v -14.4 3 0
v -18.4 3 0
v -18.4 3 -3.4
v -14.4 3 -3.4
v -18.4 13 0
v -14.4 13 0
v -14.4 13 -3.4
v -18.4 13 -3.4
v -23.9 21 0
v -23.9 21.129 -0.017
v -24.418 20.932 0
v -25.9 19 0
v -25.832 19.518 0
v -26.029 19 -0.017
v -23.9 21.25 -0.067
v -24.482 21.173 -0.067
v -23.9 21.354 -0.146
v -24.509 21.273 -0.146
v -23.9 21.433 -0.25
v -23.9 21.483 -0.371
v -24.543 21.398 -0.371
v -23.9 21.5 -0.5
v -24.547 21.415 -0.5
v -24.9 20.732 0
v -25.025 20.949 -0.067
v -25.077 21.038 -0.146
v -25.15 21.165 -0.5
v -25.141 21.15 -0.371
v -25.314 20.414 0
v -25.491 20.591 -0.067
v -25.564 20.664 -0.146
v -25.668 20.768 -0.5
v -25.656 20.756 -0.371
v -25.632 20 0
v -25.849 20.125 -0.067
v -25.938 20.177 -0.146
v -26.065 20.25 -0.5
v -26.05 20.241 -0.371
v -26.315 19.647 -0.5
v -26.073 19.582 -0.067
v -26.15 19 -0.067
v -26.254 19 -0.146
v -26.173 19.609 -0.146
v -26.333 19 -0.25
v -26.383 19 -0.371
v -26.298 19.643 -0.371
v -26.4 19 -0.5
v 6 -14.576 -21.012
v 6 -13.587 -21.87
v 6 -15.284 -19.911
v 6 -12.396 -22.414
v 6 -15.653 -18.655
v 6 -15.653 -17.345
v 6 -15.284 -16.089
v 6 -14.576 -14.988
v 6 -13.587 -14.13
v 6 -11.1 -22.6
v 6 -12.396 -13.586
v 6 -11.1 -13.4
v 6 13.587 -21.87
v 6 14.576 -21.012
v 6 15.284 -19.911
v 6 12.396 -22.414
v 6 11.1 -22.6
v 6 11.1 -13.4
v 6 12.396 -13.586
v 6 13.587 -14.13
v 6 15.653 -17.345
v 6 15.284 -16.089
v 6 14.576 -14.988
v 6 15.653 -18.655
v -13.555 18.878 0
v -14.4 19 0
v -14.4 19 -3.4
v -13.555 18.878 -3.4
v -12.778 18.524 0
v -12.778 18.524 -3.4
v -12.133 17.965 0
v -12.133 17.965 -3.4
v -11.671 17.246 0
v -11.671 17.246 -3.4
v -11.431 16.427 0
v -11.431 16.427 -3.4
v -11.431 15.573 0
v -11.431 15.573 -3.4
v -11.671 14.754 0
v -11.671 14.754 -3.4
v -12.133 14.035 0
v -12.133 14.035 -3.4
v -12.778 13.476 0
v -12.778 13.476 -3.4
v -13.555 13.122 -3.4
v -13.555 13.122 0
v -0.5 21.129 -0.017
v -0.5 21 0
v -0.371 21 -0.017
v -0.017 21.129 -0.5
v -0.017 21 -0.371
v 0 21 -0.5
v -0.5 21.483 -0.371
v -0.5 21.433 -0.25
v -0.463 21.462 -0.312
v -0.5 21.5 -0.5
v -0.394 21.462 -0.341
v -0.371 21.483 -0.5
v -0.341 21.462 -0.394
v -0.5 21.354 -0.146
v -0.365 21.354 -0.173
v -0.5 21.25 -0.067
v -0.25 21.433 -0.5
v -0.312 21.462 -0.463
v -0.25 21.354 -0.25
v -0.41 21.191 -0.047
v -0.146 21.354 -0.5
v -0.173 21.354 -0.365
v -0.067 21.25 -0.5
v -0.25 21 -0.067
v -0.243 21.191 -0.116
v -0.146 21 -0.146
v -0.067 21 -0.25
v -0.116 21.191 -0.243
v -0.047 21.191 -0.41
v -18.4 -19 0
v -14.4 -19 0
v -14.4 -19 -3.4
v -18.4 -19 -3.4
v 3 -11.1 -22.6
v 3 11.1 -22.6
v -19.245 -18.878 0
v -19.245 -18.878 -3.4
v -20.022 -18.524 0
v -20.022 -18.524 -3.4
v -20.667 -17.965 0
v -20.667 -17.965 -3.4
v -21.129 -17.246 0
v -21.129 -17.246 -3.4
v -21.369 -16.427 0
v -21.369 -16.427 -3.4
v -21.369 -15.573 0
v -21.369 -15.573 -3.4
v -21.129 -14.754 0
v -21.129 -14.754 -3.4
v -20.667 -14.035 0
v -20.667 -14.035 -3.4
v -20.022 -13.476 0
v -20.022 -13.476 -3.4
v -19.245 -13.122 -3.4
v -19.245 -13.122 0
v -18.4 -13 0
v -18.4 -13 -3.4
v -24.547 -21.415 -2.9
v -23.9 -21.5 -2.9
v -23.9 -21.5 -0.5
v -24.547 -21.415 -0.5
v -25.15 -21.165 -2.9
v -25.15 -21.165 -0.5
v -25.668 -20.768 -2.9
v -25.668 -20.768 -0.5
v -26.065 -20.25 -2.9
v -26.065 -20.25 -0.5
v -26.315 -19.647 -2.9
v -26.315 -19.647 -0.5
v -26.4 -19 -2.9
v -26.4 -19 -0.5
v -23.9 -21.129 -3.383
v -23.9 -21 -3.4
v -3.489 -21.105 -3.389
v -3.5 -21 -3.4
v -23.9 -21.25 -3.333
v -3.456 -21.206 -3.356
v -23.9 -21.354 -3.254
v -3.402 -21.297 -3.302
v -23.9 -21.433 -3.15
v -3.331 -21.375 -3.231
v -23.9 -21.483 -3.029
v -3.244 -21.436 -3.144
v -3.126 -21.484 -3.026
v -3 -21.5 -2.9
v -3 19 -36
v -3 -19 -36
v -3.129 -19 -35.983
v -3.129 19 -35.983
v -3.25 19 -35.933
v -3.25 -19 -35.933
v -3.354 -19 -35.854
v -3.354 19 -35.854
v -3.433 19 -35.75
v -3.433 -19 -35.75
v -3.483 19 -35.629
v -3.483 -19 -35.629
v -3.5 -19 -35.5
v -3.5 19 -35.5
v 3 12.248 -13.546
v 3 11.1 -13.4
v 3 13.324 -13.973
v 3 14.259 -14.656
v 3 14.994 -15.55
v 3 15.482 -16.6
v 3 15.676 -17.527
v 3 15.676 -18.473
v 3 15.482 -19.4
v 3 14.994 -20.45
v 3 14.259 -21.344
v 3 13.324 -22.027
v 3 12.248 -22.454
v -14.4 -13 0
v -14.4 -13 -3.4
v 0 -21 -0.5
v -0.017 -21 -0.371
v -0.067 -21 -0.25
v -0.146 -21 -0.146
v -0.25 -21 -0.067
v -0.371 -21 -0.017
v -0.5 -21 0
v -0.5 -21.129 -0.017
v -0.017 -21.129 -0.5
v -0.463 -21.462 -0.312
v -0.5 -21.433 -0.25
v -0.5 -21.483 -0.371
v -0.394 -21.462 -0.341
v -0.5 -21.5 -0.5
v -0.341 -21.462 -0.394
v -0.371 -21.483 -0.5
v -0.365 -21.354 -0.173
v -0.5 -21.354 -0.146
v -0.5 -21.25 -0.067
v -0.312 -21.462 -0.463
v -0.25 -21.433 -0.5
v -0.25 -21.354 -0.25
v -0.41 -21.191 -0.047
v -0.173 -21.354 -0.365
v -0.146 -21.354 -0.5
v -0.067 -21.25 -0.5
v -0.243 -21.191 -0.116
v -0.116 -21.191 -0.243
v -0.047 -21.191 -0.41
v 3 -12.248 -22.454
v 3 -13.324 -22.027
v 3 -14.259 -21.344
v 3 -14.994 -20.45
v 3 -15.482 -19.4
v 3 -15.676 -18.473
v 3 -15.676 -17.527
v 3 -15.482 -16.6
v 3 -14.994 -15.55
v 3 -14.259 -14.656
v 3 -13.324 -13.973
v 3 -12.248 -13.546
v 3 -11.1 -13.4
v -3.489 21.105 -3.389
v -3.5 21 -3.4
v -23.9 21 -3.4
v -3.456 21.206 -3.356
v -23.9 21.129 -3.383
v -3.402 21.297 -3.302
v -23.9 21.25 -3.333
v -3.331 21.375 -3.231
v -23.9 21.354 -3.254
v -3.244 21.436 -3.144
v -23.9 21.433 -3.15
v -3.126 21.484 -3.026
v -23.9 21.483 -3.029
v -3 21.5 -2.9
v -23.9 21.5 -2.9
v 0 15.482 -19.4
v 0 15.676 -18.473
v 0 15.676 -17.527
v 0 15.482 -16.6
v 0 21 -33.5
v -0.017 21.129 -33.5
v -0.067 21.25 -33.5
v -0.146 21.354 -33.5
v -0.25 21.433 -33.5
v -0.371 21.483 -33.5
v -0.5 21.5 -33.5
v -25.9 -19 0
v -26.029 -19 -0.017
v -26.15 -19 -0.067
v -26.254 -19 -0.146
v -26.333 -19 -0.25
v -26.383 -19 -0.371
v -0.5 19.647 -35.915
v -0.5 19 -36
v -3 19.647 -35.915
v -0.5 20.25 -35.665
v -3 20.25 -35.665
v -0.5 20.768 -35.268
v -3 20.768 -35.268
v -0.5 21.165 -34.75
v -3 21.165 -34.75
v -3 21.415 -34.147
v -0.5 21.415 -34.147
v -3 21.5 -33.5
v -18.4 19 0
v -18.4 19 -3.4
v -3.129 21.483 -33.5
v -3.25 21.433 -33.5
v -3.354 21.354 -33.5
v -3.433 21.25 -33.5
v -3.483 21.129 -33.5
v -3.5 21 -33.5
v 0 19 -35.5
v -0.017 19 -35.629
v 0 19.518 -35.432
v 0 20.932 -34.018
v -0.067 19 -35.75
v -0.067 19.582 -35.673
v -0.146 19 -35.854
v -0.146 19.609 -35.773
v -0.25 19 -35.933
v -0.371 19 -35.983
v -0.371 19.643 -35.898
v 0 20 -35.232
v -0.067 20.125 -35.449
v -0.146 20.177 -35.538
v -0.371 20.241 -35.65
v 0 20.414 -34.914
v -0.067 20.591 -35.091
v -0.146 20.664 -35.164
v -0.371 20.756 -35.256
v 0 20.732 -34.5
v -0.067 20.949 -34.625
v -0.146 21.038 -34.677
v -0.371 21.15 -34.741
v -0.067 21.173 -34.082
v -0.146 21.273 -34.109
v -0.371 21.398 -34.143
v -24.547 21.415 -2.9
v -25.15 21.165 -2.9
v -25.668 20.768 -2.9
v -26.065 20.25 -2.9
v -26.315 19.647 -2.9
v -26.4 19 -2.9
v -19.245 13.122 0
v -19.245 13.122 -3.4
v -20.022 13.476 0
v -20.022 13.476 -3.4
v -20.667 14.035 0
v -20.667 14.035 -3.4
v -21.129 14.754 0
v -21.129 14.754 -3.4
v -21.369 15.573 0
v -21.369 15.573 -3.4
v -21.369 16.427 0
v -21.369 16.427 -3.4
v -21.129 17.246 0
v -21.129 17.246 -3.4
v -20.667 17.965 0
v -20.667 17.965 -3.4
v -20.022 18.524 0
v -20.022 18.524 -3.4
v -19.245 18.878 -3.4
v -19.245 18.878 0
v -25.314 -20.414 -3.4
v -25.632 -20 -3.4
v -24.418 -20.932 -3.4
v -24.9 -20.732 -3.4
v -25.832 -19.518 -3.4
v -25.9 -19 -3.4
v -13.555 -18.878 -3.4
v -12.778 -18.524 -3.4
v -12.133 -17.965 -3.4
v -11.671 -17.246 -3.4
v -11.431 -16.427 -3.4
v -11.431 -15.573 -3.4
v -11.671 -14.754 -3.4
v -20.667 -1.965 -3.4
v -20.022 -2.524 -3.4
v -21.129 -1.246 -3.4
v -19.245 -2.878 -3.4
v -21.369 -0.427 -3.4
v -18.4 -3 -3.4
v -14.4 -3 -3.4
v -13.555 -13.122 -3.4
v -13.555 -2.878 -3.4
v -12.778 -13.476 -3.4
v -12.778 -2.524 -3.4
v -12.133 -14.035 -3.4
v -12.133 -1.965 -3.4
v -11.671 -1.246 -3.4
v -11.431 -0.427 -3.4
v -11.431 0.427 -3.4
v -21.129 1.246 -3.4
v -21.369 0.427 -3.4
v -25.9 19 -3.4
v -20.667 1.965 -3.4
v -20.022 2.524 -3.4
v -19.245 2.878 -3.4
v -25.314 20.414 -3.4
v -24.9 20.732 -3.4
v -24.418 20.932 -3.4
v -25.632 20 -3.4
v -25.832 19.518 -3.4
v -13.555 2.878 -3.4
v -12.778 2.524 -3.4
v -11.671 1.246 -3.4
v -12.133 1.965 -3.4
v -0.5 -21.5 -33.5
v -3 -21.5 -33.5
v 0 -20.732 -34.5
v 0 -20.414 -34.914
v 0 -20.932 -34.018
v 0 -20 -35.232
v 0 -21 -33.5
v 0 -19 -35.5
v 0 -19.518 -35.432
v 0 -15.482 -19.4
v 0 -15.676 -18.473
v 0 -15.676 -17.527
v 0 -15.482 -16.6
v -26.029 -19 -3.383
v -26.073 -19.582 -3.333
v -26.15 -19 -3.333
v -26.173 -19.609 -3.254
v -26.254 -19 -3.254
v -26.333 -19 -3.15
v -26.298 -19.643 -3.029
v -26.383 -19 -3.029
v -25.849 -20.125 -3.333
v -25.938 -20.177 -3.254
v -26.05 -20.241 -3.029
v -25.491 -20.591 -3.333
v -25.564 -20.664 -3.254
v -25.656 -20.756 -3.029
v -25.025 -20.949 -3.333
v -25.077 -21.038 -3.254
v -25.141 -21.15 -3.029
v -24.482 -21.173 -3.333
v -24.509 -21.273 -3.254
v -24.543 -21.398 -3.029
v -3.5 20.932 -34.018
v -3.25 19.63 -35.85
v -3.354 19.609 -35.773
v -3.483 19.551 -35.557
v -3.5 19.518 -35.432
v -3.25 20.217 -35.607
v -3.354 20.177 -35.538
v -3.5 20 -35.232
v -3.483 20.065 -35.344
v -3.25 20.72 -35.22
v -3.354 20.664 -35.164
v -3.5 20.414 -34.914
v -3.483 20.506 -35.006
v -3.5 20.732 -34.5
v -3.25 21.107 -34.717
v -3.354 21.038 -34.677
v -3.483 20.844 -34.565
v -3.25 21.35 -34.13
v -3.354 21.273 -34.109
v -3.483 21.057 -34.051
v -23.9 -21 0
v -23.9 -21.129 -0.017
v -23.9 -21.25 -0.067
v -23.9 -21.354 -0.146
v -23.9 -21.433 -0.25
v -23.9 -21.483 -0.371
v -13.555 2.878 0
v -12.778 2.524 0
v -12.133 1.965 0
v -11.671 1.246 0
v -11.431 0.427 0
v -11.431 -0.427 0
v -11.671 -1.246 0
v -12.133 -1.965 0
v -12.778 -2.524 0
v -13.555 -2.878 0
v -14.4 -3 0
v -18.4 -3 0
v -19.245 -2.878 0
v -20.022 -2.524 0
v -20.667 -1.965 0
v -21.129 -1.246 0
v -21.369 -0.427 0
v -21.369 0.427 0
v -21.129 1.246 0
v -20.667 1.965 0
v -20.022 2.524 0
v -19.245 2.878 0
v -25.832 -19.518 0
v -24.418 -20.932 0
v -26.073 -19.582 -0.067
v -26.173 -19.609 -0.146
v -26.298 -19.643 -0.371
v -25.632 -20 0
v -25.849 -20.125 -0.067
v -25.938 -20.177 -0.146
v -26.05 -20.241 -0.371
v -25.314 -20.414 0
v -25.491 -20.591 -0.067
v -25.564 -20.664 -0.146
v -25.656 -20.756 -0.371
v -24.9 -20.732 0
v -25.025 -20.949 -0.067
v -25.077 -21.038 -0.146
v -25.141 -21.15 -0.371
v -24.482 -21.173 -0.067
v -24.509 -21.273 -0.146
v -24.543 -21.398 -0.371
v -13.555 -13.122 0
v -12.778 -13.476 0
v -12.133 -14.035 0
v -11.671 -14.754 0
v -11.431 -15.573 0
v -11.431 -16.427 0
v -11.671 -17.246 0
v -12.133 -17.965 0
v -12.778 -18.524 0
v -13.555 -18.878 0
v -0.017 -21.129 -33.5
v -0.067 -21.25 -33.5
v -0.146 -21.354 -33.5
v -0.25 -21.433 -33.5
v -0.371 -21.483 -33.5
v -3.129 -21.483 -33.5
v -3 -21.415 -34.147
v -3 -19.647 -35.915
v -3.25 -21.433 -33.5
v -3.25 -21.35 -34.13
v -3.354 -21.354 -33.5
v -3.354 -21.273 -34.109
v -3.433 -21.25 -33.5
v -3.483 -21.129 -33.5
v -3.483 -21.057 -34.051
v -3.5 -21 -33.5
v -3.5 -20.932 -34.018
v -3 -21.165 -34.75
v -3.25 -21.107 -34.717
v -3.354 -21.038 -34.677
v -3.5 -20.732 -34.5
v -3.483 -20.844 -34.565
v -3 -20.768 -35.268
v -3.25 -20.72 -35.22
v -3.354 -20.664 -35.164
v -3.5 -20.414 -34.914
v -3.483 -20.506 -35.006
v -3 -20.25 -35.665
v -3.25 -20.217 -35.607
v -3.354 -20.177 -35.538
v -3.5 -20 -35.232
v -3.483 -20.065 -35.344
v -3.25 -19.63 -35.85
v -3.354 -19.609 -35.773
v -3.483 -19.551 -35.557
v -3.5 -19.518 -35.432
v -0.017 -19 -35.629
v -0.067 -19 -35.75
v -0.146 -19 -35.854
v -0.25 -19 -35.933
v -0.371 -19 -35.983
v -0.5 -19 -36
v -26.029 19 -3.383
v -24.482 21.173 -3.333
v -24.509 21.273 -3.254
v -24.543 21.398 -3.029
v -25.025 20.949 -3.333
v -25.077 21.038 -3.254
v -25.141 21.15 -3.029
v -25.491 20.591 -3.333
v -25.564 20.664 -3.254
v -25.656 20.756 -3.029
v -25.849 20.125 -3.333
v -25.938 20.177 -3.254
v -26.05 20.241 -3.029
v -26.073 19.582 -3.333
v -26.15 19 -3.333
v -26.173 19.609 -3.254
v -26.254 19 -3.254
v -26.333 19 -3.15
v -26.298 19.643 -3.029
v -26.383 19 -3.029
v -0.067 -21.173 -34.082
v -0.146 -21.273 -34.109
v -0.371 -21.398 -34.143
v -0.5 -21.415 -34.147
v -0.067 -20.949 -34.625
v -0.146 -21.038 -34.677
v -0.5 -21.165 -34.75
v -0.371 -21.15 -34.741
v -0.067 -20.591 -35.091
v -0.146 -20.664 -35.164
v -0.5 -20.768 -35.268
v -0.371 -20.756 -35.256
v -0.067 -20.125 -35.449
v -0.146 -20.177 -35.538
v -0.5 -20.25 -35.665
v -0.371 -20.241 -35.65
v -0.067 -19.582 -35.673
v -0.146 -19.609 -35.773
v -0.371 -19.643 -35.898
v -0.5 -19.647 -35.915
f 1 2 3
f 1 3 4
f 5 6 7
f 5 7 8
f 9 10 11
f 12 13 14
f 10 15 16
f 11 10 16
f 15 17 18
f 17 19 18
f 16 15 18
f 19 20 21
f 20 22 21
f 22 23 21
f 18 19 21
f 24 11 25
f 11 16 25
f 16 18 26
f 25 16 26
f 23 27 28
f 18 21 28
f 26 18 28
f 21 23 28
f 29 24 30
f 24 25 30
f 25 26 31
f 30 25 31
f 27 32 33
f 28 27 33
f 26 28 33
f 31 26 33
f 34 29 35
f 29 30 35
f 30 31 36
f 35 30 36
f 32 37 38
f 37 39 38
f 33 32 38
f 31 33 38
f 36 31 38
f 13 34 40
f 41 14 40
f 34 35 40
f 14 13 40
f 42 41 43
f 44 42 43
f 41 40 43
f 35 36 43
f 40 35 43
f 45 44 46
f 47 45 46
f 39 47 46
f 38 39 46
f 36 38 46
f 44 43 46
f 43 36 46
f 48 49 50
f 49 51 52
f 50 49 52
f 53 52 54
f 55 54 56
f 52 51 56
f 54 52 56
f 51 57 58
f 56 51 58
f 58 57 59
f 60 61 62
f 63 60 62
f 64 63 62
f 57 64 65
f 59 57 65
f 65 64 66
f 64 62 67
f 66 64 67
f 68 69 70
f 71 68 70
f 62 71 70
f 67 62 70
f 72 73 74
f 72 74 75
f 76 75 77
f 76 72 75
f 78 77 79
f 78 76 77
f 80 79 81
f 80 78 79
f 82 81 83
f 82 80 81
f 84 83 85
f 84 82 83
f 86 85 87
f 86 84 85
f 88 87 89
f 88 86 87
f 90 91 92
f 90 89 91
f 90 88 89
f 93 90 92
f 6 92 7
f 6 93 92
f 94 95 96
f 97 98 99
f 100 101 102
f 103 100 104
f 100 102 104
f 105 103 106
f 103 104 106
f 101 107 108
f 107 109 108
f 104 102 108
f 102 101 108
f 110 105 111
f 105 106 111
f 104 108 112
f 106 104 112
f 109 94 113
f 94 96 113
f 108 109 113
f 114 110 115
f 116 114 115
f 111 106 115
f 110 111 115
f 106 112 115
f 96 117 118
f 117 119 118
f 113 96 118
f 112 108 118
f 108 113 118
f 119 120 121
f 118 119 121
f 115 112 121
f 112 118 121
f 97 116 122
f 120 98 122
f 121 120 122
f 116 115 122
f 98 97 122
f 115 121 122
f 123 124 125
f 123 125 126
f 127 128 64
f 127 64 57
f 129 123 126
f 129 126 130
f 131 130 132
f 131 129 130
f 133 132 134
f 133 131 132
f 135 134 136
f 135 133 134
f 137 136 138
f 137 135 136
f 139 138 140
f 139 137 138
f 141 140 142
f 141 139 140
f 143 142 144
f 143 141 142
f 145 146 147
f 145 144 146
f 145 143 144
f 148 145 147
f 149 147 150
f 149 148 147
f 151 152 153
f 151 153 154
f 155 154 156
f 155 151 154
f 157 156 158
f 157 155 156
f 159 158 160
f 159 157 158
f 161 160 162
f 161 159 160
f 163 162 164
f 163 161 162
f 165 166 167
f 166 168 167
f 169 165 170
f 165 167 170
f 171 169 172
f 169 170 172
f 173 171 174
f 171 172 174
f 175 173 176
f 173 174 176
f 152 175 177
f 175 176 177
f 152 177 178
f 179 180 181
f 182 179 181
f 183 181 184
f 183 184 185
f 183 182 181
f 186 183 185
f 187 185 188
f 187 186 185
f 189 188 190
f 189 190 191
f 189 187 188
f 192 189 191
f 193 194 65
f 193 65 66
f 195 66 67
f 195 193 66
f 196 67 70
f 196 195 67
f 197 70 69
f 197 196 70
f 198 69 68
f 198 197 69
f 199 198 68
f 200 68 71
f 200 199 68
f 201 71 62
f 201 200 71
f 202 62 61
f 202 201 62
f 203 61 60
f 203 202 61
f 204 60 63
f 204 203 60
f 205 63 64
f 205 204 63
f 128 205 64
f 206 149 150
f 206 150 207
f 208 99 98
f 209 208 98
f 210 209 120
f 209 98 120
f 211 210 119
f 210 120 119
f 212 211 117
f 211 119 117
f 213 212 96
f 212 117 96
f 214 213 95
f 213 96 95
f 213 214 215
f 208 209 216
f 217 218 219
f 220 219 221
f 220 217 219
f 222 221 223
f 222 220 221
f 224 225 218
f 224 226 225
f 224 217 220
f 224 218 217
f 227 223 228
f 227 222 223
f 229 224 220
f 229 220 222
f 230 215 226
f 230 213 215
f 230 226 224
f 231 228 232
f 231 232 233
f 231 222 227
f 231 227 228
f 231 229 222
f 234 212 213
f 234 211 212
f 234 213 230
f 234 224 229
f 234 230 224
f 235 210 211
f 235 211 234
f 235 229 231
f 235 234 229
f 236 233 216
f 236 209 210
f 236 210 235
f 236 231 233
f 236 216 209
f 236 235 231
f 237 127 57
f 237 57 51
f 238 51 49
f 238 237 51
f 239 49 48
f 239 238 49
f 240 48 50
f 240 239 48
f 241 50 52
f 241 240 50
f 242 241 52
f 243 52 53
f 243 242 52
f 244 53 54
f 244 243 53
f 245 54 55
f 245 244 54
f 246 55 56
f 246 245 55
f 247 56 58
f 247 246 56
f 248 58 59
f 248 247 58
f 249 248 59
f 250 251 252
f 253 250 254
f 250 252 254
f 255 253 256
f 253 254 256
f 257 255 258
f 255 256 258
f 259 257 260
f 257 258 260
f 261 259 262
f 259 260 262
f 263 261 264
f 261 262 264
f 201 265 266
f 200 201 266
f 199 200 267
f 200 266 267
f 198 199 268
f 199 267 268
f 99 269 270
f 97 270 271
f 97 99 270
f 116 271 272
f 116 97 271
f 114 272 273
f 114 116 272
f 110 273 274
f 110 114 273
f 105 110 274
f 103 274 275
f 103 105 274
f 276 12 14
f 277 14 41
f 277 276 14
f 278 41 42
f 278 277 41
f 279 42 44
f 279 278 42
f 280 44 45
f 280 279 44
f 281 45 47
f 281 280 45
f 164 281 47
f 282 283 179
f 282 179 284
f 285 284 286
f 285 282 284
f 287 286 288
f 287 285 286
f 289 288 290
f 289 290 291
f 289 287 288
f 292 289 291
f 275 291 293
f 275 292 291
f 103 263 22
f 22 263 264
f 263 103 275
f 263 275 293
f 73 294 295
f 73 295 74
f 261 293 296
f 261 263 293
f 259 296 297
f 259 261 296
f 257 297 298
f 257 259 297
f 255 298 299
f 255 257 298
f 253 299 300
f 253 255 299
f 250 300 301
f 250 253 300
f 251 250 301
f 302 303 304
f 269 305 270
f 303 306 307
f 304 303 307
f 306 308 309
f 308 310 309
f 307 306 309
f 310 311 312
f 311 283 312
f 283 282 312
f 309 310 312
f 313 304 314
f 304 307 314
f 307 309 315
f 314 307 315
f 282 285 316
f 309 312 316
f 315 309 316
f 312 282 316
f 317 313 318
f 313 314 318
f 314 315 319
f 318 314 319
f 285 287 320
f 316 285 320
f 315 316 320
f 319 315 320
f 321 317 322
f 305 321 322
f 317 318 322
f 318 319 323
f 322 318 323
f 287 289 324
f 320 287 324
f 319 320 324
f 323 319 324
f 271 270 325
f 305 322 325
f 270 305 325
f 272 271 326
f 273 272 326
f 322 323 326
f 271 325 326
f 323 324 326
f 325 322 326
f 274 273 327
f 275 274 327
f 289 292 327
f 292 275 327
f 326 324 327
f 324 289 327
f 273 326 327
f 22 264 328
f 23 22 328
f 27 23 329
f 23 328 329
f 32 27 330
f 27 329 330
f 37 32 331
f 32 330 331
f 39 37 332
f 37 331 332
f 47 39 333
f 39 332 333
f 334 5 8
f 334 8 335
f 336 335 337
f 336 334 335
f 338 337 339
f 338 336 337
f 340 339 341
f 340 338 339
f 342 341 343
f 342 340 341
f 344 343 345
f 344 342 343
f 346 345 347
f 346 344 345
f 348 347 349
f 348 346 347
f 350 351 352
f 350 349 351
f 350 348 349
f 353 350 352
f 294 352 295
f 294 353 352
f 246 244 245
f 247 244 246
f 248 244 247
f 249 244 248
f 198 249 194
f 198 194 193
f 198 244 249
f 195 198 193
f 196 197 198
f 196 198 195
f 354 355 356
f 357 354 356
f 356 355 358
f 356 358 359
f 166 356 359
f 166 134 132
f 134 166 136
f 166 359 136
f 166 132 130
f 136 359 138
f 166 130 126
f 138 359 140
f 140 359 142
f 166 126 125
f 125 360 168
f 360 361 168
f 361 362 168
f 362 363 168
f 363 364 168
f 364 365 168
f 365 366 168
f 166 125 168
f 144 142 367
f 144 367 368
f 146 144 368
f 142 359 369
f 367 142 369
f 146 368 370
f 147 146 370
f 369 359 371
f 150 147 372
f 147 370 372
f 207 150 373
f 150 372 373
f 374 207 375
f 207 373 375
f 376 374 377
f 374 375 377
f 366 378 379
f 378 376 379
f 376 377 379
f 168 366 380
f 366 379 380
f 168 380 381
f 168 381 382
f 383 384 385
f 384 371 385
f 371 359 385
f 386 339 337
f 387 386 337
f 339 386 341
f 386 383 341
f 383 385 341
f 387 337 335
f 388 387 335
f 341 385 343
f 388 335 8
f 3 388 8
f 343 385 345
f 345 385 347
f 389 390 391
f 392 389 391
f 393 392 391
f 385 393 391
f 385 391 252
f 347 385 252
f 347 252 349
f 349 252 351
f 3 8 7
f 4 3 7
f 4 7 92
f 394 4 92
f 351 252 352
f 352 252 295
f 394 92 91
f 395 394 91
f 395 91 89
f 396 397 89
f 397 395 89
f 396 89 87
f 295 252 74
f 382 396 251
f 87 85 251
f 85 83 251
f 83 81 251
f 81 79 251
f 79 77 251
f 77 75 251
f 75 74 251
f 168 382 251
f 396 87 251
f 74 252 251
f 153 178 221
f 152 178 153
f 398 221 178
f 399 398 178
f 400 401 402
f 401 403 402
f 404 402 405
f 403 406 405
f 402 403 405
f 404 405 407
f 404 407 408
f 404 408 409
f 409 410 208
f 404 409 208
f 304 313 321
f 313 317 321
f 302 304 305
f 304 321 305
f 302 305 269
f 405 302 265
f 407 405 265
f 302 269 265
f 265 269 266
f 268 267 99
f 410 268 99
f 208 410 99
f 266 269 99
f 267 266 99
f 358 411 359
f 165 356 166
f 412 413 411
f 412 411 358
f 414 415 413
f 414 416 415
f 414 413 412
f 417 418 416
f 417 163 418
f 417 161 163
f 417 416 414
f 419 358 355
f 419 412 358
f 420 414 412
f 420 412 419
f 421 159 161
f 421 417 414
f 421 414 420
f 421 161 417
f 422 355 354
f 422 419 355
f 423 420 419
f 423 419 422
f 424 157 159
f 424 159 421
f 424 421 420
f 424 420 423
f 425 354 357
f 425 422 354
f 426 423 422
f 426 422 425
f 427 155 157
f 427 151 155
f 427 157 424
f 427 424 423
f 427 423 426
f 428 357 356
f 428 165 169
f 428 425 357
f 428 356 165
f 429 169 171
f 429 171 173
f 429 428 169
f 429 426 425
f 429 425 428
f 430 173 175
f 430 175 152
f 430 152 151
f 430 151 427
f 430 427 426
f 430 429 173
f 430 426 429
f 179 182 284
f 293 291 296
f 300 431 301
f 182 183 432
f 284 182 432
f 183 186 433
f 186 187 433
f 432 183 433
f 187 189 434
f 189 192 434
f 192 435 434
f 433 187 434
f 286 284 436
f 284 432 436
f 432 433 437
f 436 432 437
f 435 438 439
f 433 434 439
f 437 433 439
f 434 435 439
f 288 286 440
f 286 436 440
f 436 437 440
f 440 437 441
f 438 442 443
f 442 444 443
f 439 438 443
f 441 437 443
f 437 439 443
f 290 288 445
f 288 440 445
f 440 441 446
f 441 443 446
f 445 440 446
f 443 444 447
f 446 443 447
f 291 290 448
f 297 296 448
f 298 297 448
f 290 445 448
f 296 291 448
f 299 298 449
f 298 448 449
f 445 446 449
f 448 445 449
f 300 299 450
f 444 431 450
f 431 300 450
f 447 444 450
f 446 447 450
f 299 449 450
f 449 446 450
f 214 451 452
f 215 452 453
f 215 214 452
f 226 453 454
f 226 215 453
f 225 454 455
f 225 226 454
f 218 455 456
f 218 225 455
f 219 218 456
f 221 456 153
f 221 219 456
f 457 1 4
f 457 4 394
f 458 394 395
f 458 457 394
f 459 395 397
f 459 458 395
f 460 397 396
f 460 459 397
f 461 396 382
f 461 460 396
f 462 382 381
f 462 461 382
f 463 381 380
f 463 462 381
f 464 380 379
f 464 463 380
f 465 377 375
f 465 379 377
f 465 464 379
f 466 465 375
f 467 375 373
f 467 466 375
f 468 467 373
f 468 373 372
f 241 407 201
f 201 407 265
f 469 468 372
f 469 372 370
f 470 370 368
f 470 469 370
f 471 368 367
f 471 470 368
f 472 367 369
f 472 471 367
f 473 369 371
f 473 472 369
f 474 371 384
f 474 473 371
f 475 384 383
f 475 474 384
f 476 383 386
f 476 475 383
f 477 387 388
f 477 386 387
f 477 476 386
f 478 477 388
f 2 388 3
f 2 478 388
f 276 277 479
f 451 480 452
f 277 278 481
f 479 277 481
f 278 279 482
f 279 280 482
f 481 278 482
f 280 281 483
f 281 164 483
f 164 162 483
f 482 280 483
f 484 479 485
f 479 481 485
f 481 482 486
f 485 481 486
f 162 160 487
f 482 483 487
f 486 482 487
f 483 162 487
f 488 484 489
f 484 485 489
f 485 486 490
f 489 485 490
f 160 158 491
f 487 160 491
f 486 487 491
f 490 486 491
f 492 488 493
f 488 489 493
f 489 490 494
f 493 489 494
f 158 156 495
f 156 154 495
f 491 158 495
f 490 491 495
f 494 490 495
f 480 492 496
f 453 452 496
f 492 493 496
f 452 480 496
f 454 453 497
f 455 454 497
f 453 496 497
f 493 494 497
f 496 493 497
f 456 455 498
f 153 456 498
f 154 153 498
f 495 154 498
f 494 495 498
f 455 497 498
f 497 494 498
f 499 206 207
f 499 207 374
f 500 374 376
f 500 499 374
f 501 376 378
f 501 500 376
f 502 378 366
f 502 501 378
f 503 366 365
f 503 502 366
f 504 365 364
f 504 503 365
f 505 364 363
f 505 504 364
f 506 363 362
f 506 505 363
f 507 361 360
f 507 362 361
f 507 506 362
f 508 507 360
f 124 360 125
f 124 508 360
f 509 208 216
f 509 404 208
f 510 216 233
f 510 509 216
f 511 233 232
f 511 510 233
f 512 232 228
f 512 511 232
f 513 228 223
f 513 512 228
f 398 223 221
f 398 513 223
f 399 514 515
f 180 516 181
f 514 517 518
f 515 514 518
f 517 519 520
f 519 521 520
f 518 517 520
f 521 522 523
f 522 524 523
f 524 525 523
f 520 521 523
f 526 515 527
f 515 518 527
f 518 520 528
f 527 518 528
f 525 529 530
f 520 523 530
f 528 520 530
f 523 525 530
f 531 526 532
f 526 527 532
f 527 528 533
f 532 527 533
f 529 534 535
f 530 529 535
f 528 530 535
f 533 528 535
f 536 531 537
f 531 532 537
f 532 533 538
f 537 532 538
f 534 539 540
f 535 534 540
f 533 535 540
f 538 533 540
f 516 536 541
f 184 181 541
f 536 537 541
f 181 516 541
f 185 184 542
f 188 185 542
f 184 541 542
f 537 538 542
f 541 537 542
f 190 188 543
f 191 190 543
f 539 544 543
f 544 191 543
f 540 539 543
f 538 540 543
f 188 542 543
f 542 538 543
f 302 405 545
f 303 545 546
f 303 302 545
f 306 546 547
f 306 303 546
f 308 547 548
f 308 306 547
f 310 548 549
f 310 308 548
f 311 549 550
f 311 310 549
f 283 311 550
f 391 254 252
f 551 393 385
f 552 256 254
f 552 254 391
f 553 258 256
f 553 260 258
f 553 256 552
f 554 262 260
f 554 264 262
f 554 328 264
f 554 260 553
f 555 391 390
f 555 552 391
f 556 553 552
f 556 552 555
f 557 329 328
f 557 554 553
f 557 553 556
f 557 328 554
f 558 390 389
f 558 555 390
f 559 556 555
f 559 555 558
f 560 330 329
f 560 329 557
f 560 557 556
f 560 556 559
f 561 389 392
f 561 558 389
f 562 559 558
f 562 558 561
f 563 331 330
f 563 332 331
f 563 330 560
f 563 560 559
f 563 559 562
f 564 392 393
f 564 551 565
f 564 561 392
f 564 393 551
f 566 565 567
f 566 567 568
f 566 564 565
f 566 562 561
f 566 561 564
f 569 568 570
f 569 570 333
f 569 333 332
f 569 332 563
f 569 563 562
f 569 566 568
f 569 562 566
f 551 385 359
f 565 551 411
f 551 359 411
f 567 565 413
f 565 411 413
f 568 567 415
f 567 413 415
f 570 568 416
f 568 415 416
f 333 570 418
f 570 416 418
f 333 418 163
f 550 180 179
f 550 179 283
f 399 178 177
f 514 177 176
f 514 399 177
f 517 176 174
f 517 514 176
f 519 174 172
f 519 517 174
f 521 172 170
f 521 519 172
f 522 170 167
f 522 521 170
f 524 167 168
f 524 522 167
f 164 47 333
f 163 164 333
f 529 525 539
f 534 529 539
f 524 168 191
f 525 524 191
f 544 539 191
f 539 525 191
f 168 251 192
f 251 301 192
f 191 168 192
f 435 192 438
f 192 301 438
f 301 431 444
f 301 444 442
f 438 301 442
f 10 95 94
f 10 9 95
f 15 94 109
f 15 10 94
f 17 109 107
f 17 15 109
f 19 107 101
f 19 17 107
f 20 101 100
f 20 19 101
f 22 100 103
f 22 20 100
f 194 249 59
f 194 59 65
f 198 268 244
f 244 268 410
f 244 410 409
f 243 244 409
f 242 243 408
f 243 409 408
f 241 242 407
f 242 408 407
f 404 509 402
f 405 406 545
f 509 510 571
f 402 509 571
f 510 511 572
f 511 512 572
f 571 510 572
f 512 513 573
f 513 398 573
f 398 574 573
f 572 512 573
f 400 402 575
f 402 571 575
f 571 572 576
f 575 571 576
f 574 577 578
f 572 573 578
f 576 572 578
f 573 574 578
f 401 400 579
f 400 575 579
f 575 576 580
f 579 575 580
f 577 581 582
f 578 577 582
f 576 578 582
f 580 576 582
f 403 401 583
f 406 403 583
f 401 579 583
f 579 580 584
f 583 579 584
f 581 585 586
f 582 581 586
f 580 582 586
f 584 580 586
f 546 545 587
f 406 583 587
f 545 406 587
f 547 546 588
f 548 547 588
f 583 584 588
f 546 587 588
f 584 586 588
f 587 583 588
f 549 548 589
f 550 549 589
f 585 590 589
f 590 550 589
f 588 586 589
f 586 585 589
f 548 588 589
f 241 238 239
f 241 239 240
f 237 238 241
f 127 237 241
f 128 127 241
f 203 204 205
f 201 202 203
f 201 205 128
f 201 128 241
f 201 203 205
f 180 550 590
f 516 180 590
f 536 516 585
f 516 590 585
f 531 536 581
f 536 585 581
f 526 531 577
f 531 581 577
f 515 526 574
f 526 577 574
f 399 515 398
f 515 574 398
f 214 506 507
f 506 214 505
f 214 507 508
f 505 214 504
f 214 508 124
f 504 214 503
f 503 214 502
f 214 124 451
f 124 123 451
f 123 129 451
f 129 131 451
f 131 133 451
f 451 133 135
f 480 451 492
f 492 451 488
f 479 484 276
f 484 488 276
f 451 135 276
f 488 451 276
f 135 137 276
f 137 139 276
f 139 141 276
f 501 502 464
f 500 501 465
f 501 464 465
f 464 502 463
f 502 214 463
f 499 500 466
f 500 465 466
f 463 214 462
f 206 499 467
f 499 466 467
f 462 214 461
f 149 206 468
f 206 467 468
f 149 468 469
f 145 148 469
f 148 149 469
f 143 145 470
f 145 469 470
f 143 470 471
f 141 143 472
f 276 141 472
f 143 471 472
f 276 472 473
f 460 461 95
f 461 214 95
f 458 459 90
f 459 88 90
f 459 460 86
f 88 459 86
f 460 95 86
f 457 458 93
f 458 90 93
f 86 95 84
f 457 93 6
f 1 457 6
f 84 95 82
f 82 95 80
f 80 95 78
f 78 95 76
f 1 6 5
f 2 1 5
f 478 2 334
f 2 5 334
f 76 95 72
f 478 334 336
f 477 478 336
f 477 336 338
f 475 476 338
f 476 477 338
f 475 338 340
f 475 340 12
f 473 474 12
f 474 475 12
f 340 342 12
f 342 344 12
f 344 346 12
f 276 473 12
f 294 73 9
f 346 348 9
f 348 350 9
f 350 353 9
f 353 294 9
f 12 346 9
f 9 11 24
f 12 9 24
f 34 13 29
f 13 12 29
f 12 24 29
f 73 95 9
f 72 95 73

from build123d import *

# Parameters (mm, degrees)
P_IDAT_VYSUNUT_M1_DEPTH  = 21.5
P_IDAT_VYSUNUT_M2_DEPTH  = 3
P_IDAT_VYSUNUT_M3_DEPTH  = 3
ODEBRAT_VYSUNUT_M1_DEPTH = 50.550075681
ZAOBLIT1_R               = 2.5
ZAOBLIT2_R               = 0.5


with BuildPart() as part:
    # Skica2 → Přidat vysunutím1 (new, symmetric)
    with BuildSketch(Plane(origin=(0, 0, 0), x_dir=(1, 0, 0), z_dir=(0, 1, 0))):
        Polygon((0, 0), (-26.4, 0), (-26.4, 3.4), (-3.5, 3.4), (-3.5, 36), (0, 36), align=None)
    extrude(amount=P_IDAT_VYSUNUT_M1_DEPTH, both=True)

    # Skica3 → Přidat vysunutím2 (add)
    with BuildSketch(Plane(origin=(0, 0, 0), x_dir=(0, 0, -1), z_dir=(1, 0, 0))):
        with BuildLine():
            Line((16.6, 15.48178046), (16.6, -15.48178046))
            ThreePointArc((16.6, -15.48178046), (18, -15.7), (19.4, -15.48178046))
            Line((19.4, -15.48178046), (19.4, 15.48178046))
            ThreePointArc((19.4, 15.48178046), (18, 15.7), (16.6, 15.48178046))
        make_face()
    extrude(amount=P_IDAT_VYSUNUT_M2_DEPTH)

    # Skica4 → Přidat vysunutím3 (add)
    with BuildSketch(Plane(origin=(3, 0, 0), x_dir=(0, 0, -1), z_dir=(1, 0, 0))):
        with BuildLine():
            Line((13.4, -11.1), (13.4, 11.1))
            ThreePointArc((13.4, 11.1), (18, 15.7), (22.6, 11.1))
            Line((22.6, 11.1), (22.6, -11.1))
            ThreePointArc((22.6, -11.1), (18, -15.7), (13.4, -11.1))
        make_face()
    extrude(amount=P_IDAT_VYSUNUT_M3_DEPTH)

    # Skica5 → Odebrat vysunutím1 (cut, through all)
    with BuildSketch(Plane.XY):
        with BuildLine():
            Line((-14.400164981, -3), (-18.399835019, -3))
            ThreePointArc((-18.399835019, -3), (-21.399835019, 0), (-18.399835019, 3))
            Line((-18.399835019, 3), (-14.400164981, 3))
            ThreePointArc((-14.400164981, 3), (-11.400164981, 0), (-14.400164981, -3))
        make_face()
        with BuildLine():
            Line((-14.400164981, 13), (-18.399835019, 13))
            ThreePointArc((-18.399835019, 13), (-21.399835019, 16), (-18.399835019, 19))
            Line((-18.399835019, 19), (-14.400164981, 19))
            ThreePointArc((-14.400164981, 19), (-11.400164981, 16), (-14.400164981, 13))
        make_face()
        with BuildLine():
            Line((-14.400164981, -19), (-18.399835019, -19))
            ThreePointArc((-18.399835019, -19), (-21.399835019, -16), (-18.399835019, -13))
            Line((-18.399835019, -13), (-14.400164981, -13))
            ThreePointArc((-14.400164981, -13), (-11.400164981, -16), (-14.400164981, -19))
        make_face()
    extrude(amount=-ODEBRAT_VYSUNUT_M1_DEPTH, mode=Mode.SUBTRACT)

    # Zaoblit1
    zaoblit1_edges = [part.edges().sort_by_distance(p)[0] for p in [
        (-26.4, 21.5, -1.7),
        (-26.4, -21.5, -1.7),
        (-1.75, 21.5, -36),
        (-1.75, -21.5, -36),
    ]]
    fillet(zaoblit1_edges, radius=ZAOBLIT1_R)

    # Zaoblit2
    zaoblit2_edges = [part.edges().sort_by_distance(p)[0] for p in [
        (0, 0, 0),
        (-26.4, 0, 0),
        (-26.4, 0, -3.4),
        (-11.95, -21.5, 0),
        (-11.95, 21.5, 0),
        (-25.667766953, 20.767766953, 0),
        (-25.667766953, -20.767766953, 0),
        (-3.5, -21.5, -18.45),
        (-25.667766953, 20.767766953, -3.4),
        (-25.667766953, -20.767766953, -3.4),
        (-3.5, 21.5, -18.45),
        (-3.5, 0, -36),
        (0, 0, -36),
        (-3.5, 20.767766953, -35.267766953),
        (-3.5, -20.767766953, -35.267766953),
        (0, 20.767766953, -35.267766953),
        (0, -20.767766953, -35.267766953),
        (-13.7, 21.5, -3.4),
        (0, 21.5, -16.75),
        (-13.7, -21.5, -3.4),
        (0, -21.5, -16.75),
    ]]
    fillet(zaoblit2_edges, radius=ZAOBLIT2_R)


solid = part.part
